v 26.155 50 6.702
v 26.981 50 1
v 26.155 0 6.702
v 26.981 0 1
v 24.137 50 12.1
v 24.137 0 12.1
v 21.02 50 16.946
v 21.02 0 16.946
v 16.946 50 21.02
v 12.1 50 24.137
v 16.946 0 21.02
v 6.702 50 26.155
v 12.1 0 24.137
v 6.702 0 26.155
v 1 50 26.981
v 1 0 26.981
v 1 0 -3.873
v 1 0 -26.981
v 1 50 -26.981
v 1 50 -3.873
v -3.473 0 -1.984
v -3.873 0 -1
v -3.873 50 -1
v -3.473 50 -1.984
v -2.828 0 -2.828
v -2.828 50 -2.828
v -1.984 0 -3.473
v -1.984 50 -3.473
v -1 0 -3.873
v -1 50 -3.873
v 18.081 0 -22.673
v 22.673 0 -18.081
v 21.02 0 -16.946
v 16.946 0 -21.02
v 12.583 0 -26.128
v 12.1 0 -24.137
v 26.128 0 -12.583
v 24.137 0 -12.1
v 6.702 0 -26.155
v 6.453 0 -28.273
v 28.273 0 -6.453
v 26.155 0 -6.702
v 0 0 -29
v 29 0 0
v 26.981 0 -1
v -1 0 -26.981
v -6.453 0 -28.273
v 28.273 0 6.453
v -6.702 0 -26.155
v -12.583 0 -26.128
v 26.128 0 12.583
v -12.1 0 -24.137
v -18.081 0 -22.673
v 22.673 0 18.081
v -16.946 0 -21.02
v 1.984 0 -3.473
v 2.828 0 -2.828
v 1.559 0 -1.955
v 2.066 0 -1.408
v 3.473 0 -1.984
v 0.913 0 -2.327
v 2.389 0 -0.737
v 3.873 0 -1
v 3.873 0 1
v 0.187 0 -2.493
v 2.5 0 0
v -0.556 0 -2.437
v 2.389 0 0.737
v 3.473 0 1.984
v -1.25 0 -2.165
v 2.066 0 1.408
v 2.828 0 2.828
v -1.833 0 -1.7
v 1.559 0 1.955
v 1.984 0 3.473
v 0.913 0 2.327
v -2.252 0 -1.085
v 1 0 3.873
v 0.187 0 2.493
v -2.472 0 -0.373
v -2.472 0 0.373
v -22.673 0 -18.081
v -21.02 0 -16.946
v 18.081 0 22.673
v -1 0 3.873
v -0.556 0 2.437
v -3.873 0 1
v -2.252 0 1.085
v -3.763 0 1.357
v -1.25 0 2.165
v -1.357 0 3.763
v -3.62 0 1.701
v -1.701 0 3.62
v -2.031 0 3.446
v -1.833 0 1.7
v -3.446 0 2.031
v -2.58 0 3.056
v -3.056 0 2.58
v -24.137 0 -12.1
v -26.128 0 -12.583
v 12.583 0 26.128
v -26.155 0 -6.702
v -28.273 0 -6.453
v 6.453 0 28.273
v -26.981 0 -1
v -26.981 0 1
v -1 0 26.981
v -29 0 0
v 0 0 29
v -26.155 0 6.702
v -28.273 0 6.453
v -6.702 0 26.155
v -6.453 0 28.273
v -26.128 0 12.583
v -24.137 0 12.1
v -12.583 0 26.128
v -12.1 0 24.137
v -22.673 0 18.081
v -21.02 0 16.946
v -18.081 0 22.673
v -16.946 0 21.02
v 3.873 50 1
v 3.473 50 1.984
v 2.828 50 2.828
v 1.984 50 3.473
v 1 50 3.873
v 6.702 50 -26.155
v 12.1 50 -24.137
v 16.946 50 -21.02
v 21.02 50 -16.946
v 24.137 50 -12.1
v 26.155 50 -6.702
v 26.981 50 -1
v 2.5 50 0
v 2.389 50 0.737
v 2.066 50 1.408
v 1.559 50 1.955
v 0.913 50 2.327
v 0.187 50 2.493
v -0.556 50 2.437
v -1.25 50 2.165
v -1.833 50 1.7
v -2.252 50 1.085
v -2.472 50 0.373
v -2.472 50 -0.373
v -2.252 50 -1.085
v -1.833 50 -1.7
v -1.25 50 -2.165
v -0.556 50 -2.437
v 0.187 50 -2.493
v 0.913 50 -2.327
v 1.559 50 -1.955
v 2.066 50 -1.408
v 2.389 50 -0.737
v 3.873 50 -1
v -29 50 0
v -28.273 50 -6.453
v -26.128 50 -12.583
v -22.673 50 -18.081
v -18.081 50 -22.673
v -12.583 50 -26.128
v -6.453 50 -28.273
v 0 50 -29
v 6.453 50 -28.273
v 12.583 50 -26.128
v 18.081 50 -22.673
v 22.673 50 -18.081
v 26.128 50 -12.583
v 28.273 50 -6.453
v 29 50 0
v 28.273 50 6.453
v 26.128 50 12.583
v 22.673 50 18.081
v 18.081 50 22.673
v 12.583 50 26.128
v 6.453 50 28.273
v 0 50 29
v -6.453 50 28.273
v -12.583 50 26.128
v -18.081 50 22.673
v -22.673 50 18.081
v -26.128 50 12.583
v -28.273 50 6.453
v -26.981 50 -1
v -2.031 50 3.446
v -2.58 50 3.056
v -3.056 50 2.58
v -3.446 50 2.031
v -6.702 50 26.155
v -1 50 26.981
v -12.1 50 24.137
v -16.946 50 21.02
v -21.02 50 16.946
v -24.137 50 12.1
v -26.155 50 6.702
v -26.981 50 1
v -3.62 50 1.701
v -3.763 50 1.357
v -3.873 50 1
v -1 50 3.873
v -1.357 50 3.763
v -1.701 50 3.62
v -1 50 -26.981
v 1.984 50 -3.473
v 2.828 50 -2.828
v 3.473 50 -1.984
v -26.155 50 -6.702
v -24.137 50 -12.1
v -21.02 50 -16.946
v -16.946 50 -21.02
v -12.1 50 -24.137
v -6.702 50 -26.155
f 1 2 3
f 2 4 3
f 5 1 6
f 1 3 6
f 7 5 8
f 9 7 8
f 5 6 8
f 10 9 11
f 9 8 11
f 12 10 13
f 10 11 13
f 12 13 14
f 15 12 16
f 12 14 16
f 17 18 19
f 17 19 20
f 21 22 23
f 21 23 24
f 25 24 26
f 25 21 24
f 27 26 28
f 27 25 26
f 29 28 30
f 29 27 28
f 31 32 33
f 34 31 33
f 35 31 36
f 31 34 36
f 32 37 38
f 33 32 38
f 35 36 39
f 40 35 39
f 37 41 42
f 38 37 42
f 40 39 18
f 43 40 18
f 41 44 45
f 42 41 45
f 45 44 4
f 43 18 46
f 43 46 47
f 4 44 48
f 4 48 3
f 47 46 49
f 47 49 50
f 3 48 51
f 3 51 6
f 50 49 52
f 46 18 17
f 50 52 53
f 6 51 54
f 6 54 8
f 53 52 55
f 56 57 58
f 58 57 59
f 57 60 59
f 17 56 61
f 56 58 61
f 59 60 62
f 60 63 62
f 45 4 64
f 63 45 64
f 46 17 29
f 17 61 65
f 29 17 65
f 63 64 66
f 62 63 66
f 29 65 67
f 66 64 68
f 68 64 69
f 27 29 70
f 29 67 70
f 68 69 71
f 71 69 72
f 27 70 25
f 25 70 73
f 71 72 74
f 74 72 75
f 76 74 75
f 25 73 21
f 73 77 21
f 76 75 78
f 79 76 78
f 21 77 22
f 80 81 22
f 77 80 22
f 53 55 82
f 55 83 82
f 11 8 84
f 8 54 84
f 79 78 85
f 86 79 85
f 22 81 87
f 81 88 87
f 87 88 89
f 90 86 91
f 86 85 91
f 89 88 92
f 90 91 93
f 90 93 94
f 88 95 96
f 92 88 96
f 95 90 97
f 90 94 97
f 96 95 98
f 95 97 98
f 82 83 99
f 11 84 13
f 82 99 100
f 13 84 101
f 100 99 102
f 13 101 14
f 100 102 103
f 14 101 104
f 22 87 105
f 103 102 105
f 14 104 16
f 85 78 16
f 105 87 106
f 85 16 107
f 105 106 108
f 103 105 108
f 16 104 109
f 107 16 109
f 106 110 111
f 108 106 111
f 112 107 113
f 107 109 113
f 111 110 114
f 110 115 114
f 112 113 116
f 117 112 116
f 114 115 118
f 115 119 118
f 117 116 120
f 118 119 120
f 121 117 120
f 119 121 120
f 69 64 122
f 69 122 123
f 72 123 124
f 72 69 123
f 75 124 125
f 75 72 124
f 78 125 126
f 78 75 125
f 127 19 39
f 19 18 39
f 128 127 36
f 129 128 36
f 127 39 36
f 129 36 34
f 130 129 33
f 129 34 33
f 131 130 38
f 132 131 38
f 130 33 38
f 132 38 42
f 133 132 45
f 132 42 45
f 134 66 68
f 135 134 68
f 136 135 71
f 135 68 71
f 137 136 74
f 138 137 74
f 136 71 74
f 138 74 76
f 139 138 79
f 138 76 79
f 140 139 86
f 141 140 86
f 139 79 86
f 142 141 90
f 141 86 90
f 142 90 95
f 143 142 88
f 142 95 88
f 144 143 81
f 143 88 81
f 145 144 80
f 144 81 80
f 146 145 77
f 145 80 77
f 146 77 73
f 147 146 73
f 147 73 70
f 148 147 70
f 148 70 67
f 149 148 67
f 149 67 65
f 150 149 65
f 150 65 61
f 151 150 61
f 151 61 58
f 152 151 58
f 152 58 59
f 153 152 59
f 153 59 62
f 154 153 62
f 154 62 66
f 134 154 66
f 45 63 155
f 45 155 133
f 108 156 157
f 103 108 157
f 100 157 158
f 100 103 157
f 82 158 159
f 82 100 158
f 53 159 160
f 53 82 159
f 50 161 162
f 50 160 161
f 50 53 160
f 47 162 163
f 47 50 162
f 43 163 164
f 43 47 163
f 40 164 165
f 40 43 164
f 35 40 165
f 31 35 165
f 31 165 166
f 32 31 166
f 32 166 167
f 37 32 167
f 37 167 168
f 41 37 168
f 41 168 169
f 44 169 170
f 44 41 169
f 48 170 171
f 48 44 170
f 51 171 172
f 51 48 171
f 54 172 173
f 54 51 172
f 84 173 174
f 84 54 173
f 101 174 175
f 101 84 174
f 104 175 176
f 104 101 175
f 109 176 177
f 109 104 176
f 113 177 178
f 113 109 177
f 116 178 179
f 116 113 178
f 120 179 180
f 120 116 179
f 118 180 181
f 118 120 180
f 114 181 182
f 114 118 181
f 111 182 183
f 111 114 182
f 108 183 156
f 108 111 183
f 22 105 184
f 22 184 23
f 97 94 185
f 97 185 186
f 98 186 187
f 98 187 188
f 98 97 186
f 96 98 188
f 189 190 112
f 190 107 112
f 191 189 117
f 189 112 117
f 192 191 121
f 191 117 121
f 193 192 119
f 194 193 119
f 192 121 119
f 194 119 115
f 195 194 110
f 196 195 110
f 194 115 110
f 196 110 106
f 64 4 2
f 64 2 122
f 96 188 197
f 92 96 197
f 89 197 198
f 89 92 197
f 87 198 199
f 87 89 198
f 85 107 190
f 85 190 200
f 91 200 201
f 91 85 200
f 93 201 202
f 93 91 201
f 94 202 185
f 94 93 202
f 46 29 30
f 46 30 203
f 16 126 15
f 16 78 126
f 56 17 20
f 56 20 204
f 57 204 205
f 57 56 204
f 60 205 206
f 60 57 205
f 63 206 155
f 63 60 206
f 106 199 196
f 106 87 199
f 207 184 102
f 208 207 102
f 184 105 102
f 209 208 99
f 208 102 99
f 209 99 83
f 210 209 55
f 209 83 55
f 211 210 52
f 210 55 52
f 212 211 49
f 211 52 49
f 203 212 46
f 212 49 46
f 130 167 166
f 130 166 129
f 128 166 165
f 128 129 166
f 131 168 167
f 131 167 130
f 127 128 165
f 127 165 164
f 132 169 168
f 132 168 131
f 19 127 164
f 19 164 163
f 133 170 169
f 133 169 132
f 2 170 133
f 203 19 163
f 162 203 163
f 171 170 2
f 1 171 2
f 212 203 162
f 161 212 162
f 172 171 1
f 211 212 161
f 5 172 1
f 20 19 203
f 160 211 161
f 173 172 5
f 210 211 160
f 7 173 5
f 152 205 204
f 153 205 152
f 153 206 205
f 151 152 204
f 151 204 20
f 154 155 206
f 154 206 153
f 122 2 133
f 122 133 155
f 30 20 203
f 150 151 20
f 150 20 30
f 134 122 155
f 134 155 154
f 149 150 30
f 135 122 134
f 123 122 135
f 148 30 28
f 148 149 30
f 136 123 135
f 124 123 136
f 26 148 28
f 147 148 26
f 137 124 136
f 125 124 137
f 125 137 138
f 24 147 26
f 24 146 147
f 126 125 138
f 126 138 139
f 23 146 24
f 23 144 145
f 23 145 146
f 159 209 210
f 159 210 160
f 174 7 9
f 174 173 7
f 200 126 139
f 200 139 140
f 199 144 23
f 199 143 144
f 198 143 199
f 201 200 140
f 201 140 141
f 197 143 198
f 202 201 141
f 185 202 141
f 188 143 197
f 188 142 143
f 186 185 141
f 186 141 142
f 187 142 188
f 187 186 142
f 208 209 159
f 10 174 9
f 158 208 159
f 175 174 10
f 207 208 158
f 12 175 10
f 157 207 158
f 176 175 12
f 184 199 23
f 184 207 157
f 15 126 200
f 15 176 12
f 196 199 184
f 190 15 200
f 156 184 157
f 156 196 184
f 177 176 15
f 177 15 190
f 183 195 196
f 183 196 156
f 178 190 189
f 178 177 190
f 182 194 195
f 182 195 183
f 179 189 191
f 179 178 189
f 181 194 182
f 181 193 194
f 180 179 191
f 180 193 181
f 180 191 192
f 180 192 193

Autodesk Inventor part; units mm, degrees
ref_plane "YZ Plane" through (0, 0, 0) normal (1, 0, 0) x (0, 1, 0)
ref_plane "XZ Plane" through (0, 0, 0) normal (0, 1, 0) x (-1, 0, 0)
ref_plane "XY Plane" through (0, 0, 0) normal (0, 0, 1) x (1, 0, 0)
sketch "Boceto1" plane through (0, 0, 0) normal (0, 1, 0) x (-1, 0, 0)
  circle A0 centre (0, 0) radius 29
  dimension "d0" = 58
extrude "Extrusión1" add sketch "Boceto1" along normal blind 50
shell "Vaciado1" thickness 2 removed faces 2 at (2.104, 0, -7.1206) at (2.104, 50, -7.1206)
sketch "Boceto2" plane through (0, 0, 0) normal (0, -1, 0) x (1, 0, 0)
  line L0 (1, 28.5) -> (-1, 28.5)
  line L1 (-1, -28.5) -> (1, -28.5)
  line L2 (-28.5, 1) -> (-28.5, -1)
  line L3 (28.5, -1) -> (28.5, 1)
  line L4 (-19.4454, 20.8597) -> (-20.8597, 19.4454)
  line L5 (19.4454, -20.8597) -> (20.8597, -19.4454)
  line L6 (-64.7852, 95.7171) -> (-23.0659, 56.8262) construction
  line L7 (-20.8597, -19.4454) -> (-19.4454, -20.8597)
  line L8 (20.8597, 19.4454) -> (19.4454, 20.8597)
  arc A0 (-1, 3.873) -> (-2.0315, 3.4457) centre (0, 0) ccw
  line L9 (-1, 28.5) -> (-1, 3.873)
  line L10 (-3.873, 1) -> (-28.5, 1)
  line L11 (-28.5, -1) -> (-3.873, -1)
  line L12 (3.873, -1) -> (28.5, -1)
  line L13 (28.5, 1) -> (3.873, 1)
  line L14 (-1, -3.873) -> (-1, -28.5)
  line L15 (1, -28.5) -> (1, -3.873)
  line L16 (1, 3.873) -> (1, 28.5)
  arc A1 (3.873, 1) -> (1, 3.873) centre (0, 0) ccw
  arc A2 (1, -3.873) -> (3.873, -1) centre (0, 0) ccw
  arc A3 (1, -3.873) -> (3.873, -1) centre (0, 0) ccw
  arc A4 (-3.873, -1) -> (-1, -3.873) centre (0, 0) ccw
  arc A5 (-3.873, -1) -> (-1, -3.873) centre (0, 0) ccw
  arc A6 (-3.4457, 2.0315) -> (-3.873, 1) centre (0, 0) ccw
  arc A7 (3.873, 1) -> (1, 3.873) centre (0, 0) ccw
  arc A8 (-1, 3.873) -> (-3.873, 1) centre (0, 0) ccw
  circle A9 centre (0, 0) radius 2.5
  dimension "d4" = 2
  dimension "d5" = 57
  dimension "d6" = 57
  dimension "d7" = 2
  dimension "d12" = 2
  dimension "d13" = 57
  dimension "d14" = 57
  dimension "d15" = 2
  dimension "d17" = 5
extrude "Extrusión2" add sketch "Boceto2" against normal blind 50
properties part number "Tambor"
